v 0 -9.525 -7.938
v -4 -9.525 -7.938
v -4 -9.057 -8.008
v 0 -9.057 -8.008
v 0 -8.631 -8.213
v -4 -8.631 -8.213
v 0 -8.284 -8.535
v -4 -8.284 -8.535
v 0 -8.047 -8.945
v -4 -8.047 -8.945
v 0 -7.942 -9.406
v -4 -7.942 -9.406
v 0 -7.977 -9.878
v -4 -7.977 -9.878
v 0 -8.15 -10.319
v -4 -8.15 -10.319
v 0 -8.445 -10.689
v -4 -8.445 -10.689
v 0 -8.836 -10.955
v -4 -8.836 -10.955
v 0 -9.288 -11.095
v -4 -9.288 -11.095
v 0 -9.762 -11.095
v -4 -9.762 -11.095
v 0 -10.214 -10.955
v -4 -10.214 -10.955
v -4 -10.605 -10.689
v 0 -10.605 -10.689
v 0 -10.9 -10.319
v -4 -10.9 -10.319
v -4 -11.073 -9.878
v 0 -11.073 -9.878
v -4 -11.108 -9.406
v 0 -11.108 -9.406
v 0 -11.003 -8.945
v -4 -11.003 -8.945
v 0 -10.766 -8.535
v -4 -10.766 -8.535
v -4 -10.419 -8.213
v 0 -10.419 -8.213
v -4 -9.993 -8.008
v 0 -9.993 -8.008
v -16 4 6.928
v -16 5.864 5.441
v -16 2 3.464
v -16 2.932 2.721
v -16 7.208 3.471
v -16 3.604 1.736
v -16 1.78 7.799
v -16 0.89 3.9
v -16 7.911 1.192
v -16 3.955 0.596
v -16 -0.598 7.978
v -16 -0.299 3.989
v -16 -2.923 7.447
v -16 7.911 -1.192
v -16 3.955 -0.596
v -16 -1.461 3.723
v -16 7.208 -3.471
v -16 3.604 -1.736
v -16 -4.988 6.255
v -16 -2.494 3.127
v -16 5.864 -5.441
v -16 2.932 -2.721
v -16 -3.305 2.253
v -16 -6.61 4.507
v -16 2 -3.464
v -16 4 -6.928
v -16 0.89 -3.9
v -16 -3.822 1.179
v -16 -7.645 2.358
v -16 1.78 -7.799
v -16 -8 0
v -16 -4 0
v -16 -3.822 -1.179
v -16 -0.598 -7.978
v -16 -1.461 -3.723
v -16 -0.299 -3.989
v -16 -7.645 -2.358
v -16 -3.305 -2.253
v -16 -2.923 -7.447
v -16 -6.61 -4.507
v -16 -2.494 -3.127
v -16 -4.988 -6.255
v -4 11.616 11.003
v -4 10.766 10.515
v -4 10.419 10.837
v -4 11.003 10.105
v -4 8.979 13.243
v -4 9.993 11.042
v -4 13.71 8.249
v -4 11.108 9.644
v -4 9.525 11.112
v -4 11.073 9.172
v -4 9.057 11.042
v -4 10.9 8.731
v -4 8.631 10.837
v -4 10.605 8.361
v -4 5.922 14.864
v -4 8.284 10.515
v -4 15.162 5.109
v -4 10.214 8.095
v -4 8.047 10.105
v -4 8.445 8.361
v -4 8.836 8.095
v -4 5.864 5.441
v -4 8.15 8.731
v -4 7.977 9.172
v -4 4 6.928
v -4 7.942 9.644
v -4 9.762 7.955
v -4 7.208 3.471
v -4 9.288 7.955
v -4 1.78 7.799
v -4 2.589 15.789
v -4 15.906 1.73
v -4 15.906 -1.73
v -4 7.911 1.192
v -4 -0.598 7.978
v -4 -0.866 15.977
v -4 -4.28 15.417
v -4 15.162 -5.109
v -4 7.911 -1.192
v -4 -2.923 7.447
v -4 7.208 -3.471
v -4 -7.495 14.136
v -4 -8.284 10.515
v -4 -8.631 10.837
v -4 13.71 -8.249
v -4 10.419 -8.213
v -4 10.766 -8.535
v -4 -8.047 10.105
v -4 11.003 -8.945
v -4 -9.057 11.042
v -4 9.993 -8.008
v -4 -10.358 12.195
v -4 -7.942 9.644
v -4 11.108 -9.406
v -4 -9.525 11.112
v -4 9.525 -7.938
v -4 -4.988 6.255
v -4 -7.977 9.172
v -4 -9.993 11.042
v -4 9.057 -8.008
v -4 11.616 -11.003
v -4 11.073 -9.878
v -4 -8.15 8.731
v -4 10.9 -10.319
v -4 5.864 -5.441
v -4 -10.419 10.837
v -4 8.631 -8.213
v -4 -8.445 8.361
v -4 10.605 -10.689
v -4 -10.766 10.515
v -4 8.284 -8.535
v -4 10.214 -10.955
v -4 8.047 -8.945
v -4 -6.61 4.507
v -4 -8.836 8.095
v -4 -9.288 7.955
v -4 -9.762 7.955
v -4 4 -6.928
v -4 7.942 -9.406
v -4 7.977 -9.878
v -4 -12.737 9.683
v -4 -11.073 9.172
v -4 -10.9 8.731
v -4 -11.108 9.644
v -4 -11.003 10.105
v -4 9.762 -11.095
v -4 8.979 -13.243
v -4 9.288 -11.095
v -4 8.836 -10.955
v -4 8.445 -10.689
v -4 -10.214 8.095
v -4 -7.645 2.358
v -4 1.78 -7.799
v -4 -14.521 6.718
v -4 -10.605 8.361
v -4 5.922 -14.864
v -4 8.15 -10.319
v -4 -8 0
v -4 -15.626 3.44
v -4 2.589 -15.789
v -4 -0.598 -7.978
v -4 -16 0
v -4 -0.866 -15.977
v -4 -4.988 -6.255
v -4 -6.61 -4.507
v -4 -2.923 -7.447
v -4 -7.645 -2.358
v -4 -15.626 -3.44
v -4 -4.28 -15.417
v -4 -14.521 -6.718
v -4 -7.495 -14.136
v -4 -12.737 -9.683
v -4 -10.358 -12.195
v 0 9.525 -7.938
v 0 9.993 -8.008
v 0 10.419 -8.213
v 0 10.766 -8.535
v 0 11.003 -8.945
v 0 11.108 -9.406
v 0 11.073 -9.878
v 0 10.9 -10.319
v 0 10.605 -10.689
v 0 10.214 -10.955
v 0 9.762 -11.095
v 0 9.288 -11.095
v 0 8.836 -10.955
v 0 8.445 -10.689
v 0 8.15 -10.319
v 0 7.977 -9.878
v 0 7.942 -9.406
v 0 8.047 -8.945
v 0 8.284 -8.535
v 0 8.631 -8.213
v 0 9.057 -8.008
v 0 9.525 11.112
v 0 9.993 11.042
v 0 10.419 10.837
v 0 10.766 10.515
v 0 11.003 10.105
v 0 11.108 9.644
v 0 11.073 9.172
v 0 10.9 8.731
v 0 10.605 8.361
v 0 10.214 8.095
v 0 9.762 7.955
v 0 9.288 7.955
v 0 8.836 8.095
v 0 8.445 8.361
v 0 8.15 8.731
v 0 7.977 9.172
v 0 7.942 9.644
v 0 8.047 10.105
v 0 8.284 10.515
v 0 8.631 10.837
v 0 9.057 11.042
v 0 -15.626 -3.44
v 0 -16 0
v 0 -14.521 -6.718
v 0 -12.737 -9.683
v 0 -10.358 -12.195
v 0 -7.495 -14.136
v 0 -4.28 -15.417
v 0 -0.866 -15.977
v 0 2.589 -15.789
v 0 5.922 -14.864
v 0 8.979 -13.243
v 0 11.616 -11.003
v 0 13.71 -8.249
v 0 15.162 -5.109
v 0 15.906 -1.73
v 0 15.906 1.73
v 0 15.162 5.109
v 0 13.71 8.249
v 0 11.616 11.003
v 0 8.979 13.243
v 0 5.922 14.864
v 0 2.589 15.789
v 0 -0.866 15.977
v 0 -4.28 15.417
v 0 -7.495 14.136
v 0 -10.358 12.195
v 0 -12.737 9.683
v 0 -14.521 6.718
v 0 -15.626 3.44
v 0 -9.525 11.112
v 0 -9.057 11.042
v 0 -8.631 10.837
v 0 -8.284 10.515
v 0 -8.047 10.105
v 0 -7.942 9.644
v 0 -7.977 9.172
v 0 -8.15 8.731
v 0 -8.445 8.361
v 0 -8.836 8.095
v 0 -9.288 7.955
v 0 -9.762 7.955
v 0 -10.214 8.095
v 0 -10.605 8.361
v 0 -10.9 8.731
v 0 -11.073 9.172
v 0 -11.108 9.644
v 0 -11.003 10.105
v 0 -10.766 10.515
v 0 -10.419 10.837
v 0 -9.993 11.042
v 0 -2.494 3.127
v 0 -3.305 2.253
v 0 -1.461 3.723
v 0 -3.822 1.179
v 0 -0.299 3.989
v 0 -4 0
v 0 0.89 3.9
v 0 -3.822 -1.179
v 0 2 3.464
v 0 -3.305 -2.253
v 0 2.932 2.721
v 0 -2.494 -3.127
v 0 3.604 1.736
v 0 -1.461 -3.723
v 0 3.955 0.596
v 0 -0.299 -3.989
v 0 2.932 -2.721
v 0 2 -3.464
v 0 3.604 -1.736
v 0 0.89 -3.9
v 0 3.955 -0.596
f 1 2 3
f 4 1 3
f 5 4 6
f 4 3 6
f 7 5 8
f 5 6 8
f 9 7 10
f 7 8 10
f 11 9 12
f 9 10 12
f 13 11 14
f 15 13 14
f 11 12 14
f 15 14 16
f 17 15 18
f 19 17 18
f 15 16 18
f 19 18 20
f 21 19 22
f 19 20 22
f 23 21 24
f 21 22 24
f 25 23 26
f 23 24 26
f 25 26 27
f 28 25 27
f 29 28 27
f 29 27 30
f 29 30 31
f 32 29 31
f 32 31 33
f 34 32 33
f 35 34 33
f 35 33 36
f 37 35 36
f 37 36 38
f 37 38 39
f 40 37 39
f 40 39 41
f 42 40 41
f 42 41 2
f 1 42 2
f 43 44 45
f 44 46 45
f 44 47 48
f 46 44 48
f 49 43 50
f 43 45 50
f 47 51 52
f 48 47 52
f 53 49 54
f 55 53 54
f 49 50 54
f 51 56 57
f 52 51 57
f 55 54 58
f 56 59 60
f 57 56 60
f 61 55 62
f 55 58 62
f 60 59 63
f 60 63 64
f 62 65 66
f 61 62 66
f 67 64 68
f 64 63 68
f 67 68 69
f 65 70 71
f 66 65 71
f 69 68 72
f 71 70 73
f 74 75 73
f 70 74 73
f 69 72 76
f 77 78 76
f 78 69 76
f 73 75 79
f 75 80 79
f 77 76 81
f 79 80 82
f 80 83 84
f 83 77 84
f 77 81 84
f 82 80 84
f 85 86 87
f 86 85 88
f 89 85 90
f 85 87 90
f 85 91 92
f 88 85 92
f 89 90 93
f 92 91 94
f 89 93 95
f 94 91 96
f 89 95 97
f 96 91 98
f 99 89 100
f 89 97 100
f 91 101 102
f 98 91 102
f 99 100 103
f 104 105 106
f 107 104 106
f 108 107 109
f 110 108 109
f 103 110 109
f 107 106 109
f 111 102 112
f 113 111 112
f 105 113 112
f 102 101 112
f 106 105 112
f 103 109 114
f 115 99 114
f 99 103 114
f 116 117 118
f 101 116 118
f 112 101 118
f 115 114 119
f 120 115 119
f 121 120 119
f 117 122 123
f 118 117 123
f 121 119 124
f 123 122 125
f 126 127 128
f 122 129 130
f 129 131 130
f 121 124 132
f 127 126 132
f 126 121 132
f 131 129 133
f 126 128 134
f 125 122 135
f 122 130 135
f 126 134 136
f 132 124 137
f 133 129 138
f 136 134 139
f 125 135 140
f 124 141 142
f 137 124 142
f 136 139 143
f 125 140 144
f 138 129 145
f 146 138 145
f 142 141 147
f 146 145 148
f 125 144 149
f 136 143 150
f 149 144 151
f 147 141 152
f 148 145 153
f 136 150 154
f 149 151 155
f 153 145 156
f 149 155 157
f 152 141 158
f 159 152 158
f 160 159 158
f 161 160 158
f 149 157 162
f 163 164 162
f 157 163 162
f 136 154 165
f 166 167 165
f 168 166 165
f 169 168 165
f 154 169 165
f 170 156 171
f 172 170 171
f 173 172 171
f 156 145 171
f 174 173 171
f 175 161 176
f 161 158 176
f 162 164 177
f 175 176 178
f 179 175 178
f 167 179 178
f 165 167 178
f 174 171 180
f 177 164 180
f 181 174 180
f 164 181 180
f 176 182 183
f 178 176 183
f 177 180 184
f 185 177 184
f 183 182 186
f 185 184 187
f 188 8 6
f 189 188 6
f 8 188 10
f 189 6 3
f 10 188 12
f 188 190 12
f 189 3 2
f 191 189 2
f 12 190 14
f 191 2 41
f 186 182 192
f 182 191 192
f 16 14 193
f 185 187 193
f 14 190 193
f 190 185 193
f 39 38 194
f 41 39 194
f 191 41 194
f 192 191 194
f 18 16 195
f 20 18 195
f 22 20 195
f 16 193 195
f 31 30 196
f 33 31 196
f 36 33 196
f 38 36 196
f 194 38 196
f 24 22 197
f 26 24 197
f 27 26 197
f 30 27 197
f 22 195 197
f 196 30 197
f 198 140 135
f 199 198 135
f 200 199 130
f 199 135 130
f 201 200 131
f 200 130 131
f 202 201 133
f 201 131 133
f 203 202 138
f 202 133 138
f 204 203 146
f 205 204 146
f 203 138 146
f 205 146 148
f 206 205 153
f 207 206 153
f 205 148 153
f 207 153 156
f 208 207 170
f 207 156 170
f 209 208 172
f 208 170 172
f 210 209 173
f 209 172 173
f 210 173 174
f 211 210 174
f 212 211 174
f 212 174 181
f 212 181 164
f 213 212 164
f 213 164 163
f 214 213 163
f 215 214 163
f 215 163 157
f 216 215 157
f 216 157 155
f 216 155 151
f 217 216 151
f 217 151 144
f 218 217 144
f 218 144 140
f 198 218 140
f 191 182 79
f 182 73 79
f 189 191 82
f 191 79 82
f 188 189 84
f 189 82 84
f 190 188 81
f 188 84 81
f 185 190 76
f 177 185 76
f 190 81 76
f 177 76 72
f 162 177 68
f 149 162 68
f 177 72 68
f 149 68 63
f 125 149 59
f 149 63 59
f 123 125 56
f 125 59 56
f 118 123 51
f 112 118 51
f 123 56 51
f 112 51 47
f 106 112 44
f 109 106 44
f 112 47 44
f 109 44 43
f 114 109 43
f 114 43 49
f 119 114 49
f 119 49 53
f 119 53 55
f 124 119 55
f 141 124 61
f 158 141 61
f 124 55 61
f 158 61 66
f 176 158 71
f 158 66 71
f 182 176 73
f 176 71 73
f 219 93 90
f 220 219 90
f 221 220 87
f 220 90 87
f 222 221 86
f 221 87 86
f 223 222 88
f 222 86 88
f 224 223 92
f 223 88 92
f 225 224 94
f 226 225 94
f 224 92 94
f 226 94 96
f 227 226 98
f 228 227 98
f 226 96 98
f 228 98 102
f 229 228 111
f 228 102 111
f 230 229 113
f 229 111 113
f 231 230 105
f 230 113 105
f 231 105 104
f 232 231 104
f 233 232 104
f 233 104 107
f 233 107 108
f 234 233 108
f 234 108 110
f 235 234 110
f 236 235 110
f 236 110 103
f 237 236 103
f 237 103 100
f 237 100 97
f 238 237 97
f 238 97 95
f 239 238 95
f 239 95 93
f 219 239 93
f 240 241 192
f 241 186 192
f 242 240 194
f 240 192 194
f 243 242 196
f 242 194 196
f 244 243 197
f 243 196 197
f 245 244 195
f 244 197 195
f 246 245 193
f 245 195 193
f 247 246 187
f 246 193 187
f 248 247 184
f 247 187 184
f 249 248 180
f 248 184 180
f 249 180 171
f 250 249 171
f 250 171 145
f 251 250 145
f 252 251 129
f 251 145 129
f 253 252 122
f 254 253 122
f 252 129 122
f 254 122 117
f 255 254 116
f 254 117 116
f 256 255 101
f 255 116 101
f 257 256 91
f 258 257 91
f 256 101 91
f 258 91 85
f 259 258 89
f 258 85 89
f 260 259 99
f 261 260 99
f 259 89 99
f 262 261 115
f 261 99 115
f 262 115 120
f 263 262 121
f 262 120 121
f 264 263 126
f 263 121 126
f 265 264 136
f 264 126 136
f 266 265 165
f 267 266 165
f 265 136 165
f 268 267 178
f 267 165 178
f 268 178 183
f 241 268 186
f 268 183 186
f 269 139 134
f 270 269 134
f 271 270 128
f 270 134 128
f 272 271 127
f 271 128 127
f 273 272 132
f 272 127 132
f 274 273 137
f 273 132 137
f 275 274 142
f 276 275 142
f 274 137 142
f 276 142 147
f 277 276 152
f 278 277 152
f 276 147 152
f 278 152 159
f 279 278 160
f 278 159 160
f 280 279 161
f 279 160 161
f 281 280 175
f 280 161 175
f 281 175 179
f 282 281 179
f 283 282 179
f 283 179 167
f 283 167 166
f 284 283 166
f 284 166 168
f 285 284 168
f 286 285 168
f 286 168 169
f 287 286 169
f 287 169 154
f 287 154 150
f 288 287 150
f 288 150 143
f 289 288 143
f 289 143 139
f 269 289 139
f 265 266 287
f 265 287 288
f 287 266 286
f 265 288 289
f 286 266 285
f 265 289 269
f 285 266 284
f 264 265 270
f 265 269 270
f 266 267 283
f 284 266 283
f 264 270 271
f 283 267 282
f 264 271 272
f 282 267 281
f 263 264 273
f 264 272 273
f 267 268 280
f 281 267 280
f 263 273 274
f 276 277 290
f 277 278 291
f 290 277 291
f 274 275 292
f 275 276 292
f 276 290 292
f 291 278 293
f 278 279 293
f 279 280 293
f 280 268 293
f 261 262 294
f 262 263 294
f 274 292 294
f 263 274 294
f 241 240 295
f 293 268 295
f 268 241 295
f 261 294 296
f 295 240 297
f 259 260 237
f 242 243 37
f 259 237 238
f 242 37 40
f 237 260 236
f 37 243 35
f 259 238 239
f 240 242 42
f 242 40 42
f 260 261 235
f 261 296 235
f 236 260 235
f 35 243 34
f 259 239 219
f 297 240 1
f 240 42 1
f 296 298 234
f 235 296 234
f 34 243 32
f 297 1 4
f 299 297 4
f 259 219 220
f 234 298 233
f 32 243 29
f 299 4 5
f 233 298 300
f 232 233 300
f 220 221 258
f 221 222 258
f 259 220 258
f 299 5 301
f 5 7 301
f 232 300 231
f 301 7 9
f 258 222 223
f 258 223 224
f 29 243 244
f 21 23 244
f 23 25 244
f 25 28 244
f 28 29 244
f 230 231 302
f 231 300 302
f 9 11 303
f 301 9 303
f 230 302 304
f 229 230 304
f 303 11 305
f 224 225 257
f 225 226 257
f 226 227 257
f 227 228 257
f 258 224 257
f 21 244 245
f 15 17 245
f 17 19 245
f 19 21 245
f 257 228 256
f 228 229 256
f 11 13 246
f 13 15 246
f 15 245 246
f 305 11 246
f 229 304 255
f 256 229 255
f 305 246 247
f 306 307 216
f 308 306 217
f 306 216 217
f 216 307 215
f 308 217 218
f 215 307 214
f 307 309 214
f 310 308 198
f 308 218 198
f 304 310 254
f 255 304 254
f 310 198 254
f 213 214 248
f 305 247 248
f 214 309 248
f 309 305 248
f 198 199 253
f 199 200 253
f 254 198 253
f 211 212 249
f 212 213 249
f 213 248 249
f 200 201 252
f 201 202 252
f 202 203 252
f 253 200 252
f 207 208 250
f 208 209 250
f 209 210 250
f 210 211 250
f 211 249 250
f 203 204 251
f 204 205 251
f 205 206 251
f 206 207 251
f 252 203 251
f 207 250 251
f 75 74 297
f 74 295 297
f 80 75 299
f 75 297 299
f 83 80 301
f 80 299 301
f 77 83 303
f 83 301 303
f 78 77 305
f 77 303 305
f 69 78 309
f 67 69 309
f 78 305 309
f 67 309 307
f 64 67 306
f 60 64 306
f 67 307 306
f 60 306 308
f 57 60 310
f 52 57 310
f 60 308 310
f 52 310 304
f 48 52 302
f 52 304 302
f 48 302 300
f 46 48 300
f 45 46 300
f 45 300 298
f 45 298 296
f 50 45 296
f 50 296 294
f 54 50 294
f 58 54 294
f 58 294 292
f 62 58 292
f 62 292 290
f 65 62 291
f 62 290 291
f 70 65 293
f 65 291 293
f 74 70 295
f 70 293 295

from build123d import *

# Parameters (mm, degrees)
CUT_EXTRUDE1_REACH = 6
SKETCH3_R          = 1.5875


with BuildPart() as part:
    # Sketch2 → Revolve1 (revolve)
    with BuildSketch(Plane.XY):
        Polygon((-16, -4), (0, -4), (0, -16.000000004), (-4, -16.000000004), (-4, -8), (-16, -8), align=None)
    revolve(axis=Axis((-12.310421286, 0, 0), (1, 0, 0)))

    # Sketch3 → Cut-Extrude1 (cut, up to next)
    with BuildSketch(Plane.ZY.offset(4), mode=Mode.PRIVATE) as cut_extrude1_sk1:
        with Locations((-9.525, 9.525)):
            Circle(SKETCH3_R)
    cut_extrude1_tool1 = extrude(cut_extrude1_sk1.sketch, amount=-CUT_EXTRUDE1_REACH, mode=Mode.PRIVATE) & part.part
    add(cut_extrude1_tool1.solids().sort_by_distance((-4, 9.525, -9.525))[0], mode=Mode.SUBTRACT)
    # Sketch3 → Cut-Extrude1 (cut, up to next)
    with BuildSketch(Plane.ZY.offset(4), mode=Mode.PRIVATE) as cut_extrude1_sk2:
        with Locations((-9.525, -9.525)):
            Circle(SKETCH3_R)
    cut_extrude1_tool2 = extrude(cut_extrude1_sk2.sketch, amount=-CUT_EXTRUDE1_REACH, mode=Mode.PRIVATE) & part.part
    add(cut_extrude1_tool2.solids().sort_by_distance((-4, -9.525, -9.525))[0], mode=Mode.SUBTRACT)
    # Sketch3 → Cut-Extrude1 (cut, up to next)
    with BuildSketch(Plane.ZY.offset(4), mode=Mode.PRIVATE) as cut_extrude1_sk3:
        with Locations((9.525, -9.525)):
            Circle(SKETCH3_R)
    cut_extrude1_tool3 = extrude(cut_extrude1_sk3.sketch, amount=-CUT_EXTRUDE1_REACH, mode=Mode.PRIVATE) & part.part
    add(cut_extrude1_tool3.solids().sort_by_distance((-4, -9.525, 9.525))[0], mode=Mode.SUBTRACT)
    # Sketch3 → Cut-Extrude1 (cut, up to next)
    with BuildSketch(Plane.ZY.offset(4), mode=Mode.PRIVATE) as cut_extrude1_sk4:
        with Locations((9.525, 9.525)):
            Circle(SKETCH3_R)
    cut_extrude1_tool4 = extrude(cut_extrude1_sk4.sketch, amount=-CUT_EXTRUDE1_REACH, mode=Mode.PRIVATE) & part.part
    add(cut_extrude1_tool4.solids().sort_by_distance((-4, 9.525, 9.525))[0], mode=Mode.SUBTRACT)


solid = part.part
